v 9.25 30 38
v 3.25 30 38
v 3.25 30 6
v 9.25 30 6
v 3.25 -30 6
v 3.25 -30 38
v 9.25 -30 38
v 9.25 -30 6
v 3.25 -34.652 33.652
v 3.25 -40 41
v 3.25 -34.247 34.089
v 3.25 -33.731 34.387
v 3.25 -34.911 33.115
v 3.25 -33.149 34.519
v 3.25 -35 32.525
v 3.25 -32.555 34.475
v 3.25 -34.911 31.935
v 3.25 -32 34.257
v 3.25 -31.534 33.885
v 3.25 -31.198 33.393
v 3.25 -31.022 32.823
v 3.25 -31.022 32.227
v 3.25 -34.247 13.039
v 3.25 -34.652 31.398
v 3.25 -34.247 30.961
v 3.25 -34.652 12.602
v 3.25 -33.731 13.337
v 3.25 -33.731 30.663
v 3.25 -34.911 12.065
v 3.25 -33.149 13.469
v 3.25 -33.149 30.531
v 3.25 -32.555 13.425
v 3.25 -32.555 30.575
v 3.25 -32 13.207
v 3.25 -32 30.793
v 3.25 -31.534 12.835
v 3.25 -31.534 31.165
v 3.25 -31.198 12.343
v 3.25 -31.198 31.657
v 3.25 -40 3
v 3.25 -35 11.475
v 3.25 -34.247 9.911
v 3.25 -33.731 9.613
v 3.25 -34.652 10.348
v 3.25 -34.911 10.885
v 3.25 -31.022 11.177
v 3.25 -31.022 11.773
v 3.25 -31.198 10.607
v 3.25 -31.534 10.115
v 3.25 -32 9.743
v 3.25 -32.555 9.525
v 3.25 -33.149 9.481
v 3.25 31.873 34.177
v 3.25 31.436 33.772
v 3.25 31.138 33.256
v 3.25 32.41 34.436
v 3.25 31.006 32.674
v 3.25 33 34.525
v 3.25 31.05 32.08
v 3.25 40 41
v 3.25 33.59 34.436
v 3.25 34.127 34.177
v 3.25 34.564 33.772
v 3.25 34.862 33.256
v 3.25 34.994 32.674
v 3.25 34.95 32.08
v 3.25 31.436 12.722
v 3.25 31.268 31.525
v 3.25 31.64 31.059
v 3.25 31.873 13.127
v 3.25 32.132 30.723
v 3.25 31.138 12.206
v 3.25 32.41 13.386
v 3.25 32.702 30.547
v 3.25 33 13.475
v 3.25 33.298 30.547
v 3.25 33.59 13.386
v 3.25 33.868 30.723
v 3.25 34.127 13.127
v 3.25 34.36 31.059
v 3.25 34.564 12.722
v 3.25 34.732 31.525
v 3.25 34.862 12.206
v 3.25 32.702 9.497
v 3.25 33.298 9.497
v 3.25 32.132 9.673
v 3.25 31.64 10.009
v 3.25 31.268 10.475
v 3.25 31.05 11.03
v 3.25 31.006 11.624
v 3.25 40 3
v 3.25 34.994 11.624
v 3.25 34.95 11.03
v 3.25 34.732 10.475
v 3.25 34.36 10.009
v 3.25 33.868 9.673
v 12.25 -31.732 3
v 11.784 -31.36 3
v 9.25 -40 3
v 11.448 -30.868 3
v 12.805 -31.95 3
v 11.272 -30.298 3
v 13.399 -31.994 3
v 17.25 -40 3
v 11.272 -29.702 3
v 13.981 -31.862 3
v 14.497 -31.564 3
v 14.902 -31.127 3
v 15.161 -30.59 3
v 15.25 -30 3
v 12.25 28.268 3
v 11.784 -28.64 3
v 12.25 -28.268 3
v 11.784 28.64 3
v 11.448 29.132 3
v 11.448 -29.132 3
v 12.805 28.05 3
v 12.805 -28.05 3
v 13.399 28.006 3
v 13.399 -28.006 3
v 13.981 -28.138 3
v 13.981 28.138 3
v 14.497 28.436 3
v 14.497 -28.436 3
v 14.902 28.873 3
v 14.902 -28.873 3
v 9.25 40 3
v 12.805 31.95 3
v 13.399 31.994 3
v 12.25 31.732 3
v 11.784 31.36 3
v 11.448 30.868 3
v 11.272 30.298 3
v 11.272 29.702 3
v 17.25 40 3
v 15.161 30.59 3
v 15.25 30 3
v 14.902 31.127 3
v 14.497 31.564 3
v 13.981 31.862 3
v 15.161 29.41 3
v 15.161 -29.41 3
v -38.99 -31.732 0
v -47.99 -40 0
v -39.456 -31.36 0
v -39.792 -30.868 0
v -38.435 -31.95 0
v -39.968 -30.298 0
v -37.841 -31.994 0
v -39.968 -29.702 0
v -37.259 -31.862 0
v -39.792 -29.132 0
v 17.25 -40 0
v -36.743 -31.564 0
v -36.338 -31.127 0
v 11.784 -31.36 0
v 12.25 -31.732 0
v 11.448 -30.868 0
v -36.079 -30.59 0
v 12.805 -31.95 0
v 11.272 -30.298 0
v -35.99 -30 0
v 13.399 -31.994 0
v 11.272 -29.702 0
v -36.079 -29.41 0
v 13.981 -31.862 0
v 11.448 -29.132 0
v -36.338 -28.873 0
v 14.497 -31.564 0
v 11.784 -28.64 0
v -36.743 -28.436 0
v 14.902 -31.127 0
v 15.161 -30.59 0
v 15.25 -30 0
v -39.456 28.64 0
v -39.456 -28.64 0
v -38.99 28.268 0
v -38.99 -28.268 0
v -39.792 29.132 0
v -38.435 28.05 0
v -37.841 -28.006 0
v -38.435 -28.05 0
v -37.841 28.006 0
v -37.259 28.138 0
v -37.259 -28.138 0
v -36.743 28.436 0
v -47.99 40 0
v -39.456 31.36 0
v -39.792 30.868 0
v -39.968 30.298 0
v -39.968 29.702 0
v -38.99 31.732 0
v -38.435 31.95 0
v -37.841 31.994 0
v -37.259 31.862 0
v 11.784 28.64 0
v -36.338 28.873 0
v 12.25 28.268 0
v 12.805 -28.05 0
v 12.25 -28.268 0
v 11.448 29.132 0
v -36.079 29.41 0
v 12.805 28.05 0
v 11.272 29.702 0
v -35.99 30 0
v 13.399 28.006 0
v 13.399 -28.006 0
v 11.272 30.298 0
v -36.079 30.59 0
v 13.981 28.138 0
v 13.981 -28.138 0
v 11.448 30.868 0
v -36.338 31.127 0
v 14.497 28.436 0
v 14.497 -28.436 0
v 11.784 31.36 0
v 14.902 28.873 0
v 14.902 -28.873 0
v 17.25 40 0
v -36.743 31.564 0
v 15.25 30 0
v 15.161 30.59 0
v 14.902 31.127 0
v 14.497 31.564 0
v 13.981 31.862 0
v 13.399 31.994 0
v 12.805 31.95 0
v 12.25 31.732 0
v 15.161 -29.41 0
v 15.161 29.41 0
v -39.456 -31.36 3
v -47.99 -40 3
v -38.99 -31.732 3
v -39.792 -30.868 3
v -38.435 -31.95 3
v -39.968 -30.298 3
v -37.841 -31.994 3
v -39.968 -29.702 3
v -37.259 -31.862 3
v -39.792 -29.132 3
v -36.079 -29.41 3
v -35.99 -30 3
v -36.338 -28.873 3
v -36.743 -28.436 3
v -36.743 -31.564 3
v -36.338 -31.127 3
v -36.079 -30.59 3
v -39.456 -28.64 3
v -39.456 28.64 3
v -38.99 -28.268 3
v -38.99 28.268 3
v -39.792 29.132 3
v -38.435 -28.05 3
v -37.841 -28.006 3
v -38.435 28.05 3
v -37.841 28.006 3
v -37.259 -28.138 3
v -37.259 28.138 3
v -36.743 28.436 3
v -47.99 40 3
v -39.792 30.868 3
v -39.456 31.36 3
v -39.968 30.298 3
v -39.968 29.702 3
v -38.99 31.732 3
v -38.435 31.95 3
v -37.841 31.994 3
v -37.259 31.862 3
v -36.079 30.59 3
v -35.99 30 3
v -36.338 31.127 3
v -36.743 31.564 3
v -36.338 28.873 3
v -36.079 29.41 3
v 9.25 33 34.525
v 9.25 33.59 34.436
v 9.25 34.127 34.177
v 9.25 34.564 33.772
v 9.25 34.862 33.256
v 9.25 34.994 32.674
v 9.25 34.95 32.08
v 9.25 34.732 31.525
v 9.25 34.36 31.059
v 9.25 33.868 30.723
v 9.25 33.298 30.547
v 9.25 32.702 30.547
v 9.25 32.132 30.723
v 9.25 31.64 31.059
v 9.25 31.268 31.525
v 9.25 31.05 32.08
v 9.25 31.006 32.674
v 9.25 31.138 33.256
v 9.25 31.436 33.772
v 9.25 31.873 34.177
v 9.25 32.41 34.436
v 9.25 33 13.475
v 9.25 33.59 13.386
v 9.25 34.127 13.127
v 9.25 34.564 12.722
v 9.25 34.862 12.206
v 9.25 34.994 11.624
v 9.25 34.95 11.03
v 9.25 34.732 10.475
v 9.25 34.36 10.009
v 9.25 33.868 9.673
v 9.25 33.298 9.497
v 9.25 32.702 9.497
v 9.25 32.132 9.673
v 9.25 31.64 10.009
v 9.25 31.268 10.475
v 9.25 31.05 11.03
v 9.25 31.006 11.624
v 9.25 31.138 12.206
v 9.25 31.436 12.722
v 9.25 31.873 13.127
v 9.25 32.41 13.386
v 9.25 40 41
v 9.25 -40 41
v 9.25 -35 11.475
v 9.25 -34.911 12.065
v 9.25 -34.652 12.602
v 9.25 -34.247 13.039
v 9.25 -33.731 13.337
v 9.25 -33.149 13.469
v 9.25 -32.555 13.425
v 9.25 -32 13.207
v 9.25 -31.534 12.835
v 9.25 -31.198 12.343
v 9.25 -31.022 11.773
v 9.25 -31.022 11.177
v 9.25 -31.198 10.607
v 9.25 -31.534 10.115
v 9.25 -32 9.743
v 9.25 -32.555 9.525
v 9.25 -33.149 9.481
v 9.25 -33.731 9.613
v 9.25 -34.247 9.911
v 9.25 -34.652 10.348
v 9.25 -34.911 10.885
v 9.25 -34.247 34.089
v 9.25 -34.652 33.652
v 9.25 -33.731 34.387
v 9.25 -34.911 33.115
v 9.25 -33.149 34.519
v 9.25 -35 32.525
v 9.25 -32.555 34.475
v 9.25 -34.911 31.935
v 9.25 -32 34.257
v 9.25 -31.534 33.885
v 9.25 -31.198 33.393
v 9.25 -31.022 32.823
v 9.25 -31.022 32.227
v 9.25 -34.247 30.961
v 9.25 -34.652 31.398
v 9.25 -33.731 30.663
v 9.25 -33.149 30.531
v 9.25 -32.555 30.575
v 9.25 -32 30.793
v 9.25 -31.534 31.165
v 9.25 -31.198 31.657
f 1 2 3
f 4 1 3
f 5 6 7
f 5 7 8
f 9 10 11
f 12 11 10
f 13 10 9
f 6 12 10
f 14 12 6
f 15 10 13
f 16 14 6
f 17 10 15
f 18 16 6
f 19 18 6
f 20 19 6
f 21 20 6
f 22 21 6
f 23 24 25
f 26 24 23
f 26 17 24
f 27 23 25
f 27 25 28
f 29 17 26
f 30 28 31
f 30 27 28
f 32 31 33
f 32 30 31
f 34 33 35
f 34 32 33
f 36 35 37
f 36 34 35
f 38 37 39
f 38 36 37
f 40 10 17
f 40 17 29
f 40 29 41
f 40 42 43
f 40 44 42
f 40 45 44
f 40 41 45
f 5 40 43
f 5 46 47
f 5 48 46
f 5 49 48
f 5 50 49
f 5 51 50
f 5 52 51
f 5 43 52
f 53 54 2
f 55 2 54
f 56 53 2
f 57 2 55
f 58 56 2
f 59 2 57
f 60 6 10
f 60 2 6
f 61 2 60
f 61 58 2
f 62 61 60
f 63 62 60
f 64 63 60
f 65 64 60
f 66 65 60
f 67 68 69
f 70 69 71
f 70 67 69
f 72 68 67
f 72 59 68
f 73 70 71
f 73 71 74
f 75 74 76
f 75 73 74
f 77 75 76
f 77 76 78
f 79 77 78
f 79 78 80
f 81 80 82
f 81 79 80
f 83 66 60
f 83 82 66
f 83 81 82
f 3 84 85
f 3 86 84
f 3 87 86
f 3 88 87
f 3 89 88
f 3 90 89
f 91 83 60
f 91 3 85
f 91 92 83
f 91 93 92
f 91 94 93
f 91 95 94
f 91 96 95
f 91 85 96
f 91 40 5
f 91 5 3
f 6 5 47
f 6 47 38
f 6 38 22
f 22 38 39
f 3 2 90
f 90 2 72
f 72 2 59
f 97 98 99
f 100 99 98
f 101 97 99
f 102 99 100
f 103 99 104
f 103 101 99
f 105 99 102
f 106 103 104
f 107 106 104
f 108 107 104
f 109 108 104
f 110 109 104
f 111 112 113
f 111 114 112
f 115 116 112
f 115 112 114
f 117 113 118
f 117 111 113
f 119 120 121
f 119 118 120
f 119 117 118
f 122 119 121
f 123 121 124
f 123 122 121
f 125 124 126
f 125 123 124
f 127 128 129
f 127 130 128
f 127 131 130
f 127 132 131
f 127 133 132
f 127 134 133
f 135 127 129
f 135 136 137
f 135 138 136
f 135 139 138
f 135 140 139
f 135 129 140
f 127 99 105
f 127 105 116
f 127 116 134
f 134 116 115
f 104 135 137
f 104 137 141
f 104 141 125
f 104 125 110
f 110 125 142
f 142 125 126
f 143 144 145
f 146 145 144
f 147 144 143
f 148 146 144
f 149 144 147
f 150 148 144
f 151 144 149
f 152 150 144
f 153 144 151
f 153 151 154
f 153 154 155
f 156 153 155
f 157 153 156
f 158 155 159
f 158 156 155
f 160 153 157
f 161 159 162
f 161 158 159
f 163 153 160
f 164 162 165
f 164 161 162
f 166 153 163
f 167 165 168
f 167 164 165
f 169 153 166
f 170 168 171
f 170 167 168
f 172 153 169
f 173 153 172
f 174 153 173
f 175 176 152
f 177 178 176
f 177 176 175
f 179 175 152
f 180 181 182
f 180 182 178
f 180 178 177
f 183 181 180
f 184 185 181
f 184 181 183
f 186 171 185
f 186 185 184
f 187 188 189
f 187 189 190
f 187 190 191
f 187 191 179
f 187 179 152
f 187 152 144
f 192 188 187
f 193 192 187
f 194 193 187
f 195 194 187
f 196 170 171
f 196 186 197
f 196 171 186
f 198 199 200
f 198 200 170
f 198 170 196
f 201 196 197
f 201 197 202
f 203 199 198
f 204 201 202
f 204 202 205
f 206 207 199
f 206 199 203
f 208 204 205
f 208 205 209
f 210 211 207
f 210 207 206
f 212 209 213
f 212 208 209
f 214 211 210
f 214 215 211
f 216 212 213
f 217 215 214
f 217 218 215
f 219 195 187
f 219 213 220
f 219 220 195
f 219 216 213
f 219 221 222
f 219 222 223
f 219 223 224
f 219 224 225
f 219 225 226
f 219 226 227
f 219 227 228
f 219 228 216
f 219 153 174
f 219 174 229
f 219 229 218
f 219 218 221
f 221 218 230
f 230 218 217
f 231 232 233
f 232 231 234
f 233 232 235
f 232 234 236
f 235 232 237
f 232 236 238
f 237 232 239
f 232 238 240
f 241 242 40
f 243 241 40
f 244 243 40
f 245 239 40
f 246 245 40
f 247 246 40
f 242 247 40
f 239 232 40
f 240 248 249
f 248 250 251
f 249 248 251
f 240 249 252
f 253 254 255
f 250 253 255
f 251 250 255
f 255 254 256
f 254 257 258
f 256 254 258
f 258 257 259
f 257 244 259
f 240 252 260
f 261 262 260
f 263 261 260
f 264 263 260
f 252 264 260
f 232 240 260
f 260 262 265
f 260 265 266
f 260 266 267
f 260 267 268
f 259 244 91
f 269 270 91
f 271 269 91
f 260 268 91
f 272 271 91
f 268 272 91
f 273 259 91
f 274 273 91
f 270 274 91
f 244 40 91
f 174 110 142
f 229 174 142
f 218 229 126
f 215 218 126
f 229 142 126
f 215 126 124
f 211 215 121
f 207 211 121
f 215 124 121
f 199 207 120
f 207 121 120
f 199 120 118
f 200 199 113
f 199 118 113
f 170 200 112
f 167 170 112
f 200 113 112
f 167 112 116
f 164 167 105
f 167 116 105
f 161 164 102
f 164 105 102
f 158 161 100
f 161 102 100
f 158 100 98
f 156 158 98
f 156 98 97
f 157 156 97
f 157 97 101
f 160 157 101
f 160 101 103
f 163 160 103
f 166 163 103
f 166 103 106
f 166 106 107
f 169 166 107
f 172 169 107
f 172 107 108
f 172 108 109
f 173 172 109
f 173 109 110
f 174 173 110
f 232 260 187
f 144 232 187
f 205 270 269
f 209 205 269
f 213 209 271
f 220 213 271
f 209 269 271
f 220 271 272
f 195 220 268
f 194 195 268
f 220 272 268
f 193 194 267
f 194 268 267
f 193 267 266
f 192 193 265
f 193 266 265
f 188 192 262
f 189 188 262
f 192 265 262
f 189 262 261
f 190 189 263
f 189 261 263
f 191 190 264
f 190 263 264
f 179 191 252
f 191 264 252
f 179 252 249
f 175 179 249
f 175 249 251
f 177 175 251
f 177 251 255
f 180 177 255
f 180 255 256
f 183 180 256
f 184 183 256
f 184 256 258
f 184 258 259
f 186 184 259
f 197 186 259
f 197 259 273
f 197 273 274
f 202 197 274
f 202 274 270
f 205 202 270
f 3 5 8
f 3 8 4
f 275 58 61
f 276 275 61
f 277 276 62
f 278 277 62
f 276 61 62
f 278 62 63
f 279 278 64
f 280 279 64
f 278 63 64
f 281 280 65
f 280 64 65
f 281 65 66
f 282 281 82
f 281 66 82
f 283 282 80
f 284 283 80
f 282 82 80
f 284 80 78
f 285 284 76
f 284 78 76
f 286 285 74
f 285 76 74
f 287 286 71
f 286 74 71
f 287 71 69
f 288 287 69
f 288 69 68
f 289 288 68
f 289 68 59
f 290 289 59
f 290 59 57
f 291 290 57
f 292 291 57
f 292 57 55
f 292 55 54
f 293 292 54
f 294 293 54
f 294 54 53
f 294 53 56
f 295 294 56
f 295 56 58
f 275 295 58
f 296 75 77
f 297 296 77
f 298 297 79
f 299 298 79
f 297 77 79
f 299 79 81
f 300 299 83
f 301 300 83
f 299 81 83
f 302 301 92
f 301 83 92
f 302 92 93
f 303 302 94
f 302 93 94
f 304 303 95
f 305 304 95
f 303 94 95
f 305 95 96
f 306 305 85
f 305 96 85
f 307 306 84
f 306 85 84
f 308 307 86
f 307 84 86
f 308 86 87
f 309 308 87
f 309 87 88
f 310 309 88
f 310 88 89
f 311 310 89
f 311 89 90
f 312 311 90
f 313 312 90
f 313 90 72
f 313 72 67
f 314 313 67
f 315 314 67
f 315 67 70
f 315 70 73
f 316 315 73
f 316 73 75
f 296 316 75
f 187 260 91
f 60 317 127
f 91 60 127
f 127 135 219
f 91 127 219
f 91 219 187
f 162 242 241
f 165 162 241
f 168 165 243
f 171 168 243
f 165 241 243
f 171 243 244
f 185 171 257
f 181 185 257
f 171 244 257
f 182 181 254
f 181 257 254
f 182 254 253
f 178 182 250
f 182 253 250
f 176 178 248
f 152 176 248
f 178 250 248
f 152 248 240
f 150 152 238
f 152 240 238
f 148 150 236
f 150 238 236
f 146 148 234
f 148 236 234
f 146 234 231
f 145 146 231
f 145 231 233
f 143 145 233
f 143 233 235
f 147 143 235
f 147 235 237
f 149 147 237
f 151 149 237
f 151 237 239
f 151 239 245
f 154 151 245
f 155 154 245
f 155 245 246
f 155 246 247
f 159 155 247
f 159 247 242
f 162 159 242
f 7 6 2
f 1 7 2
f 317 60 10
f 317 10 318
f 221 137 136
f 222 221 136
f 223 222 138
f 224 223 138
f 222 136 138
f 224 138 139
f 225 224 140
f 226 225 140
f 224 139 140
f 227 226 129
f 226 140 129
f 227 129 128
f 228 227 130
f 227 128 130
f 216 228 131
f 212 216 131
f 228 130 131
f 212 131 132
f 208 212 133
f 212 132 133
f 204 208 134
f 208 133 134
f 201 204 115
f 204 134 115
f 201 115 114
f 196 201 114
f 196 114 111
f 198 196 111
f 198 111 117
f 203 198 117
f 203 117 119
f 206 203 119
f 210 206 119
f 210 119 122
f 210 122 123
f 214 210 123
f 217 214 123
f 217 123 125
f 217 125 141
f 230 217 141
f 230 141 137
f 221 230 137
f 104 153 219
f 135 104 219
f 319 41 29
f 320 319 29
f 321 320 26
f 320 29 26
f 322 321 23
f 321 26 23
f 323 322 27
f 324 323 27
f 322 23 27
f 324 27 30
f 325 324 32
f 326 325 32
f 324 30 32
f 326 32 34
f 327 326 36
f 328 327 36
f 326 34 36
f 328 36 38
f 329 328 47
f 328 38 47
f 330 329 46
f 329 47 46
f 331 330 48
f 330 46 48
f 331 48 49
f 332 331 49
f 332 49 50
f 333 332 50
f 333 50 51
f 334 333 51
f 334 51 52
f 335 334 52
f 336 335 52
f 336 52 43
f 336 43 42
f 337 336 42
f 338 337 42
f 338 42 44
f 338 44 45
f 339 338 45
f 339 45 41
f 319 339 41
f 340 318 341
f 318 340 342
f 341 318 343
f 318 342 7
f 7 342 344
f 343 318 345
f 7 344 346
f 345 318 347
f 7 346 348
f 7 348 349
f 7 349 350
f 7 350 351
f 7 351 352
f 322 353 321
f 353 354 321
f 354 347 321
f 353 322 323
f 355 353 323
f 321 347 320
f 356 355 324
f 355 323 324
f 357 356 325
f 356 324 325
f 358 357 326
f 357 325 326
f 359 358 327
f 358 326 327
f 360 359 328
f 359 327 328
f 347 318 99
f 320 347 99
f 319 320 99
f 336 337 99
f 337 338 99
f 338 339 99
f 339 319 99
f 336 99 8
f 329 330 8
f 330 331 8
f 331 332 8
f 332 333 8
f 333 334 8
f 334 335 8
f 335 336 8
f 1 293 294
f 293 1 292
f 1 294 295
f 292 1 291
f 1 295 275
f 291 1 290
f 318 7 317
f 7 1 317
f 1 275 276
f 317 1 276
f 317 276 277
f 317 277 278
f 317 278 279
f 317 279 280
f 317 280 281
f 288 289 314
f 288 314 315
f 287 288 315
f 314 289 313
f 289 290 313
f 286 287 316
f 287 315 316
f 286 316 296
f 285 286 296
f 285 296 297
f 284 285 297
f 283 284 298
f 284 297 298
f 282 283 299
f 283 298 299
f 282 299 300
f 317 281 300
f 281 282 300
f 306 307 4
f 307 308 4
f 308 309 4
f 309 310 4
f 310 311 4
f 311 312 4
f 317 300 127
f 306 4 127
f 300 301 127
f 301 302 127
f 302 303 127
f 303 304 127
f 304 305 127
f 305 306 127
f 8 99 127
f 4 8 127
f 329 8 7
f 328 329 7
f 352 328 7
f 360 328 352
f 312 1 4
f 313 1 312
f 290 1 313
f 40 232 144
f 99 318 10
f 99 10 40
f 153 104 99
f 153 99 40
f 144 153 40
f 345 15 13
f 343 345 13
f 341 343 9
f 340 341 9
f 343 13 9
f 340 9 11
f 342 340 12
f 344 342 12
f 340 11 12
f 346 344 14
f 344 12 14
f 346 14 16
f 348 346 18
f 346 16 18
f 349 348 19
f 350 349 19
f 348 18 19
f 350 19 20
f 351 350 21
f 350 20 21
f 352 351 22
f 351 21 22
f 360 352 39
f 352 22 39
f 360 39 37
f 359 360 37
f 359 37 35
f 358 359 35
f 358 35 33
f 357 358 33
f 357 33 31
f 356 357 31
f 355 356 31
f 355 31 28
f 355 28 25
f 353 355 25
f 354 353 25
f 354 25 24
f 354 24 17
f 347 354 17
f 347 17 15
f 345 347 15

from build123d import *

# Parameters (mm, degrees)
CROQUIS2_W                 = 34.5
CROQUIS2_H                 = 80
SALIENTE_EXTRUIR2_DEPTH    = 3
CROQUIS3_W                 = 6
CROQUIS3_H                 = 80
SALIENTE_EXTRUIR3_DEPTH    = 38
CORTAR_EXTRUIR3_DEPTH      = 64.112993908
CORTAR_EXTRUIR3_DEPTH_BACK = 64.112993908
CROQUIS7_W                 = 32
CROQUIS7_H                 = 60
CROQUIS5_R                 = 2
CORTAR_EXTRUIR2_DEPTH      = 61.837899372
CROQUIS8_W                 = 3
CROQUIS8_H                 = 80
SALIENTE_EXTRUIR5_DEPTH    = 30.74
CROQUIS9_R                 = 2
CORTAR_EXTRUIR4_DEPTH      = 30.74
CROQUIS10_R                = 2
CORTAR_EXTRUIR5_DEPTH      = 194


with BuildPart() as part:
    # Croquis2 → Saliente-Extruir2 (new body)
    with BuildSketch(Plane.XY):
        Rectangle(CROQUIS2_W, CROQUIS2_H)
    extrude(amount=SALIENTE_EXTRUIR2_DEPTH)

    # Croquis3 → Saliente-Extruir3 (add)
    with BuildSketch(Plane.XY.offset(3)):
        with Locations((6.25, 0)):
            Rectangle(CROQUIS3_W, CROQUIS3_H)
    extrude(amount=SALIENTE_EXTRUIR3_DEPTH)

    # Croquis7 → Cortar-Extruir3 (cut, two sides: drawn at the far end of the back side and taken through both)
    with BuildSketch(Plane(origin=(9.25, 0, 0), x_dir=(0, 0, -1), z_dir=(1, 0, 0)).offset(-CORTAR_EXTRUIR3_DEPTH_BACK)):
        with Locations((-22, 0)):
            Rectangle(CROQUIS7_W, CROQUIS7_H)
    extrude(amount=CORTAR_EXTRUIR3_DEPTH + CORTAR_EXTRUIR3_DEPTH_BACK, mode=Mode.SUBTRACT)

    # Croquis5 → Cortar-Extruir2 (cut, through all)
    with BuildSketch(Plane.ZY.offset(-3.25)):
        with Locations((11.475, 33)):
            Circle(CROQUIS5_R)
        with Locations((32.525, 33)):
            Circle(CROQUIS5_R)
        with Locations(Location((32.525, -33, 0), (0, 0, 270))):
            Circle(CROQUIS5_R)
        with Locations(Location((11.475, -33, 0), (0, 0, 270))):
            Circle(CROQUIS5_R)
    extrude(amount=-CORTAR_EXTRUIR2_DEPTH, mode=Mode.SUBTRACT)

    # Croquis8 → Saliente-Extruir5 (add)
    with BuildSketch(Plane(origin=(-17.25, -40, 0), x_dir=(0, 0, -1), z_dir=(1, 0, 0))):
        with Locations((-1.5, 40)):
            Rectangle(CROQUIS8_W, CROQUIS8_H)
    extrude(amount=-SALIENTE_EXTRUIR5_DEPTH)

    # Croquis9 → Cortar-Extruir4 (cut)
    with BuildSketch(Plane.XY.offset(3)):
        with Locations((-37.99, 30)):
            Circle(CROQUIS9_R)
        with Locations((-37.99, -30)):
            Circle(CROQUIS9_R)
    extrude(amount=-CORTAR_EXTRUIR4_DEPTH, mode=Mode.SUBTRACT)

    # Croquis10 → Cortar-Extruir5 (cut)
    with BuildSketch(Plane.XY.offset(3)):
        with Locations((13.25, 30)):
            Circle(CROQUIS10_R)
        with Locations((13.25, -30)):
            Circle(CROQUIS10_R)
    extrude(amount=-CORTAR_EXTRUIR5_DEPTH, mode=Mode.SUBTRACT)


solid = part.part
